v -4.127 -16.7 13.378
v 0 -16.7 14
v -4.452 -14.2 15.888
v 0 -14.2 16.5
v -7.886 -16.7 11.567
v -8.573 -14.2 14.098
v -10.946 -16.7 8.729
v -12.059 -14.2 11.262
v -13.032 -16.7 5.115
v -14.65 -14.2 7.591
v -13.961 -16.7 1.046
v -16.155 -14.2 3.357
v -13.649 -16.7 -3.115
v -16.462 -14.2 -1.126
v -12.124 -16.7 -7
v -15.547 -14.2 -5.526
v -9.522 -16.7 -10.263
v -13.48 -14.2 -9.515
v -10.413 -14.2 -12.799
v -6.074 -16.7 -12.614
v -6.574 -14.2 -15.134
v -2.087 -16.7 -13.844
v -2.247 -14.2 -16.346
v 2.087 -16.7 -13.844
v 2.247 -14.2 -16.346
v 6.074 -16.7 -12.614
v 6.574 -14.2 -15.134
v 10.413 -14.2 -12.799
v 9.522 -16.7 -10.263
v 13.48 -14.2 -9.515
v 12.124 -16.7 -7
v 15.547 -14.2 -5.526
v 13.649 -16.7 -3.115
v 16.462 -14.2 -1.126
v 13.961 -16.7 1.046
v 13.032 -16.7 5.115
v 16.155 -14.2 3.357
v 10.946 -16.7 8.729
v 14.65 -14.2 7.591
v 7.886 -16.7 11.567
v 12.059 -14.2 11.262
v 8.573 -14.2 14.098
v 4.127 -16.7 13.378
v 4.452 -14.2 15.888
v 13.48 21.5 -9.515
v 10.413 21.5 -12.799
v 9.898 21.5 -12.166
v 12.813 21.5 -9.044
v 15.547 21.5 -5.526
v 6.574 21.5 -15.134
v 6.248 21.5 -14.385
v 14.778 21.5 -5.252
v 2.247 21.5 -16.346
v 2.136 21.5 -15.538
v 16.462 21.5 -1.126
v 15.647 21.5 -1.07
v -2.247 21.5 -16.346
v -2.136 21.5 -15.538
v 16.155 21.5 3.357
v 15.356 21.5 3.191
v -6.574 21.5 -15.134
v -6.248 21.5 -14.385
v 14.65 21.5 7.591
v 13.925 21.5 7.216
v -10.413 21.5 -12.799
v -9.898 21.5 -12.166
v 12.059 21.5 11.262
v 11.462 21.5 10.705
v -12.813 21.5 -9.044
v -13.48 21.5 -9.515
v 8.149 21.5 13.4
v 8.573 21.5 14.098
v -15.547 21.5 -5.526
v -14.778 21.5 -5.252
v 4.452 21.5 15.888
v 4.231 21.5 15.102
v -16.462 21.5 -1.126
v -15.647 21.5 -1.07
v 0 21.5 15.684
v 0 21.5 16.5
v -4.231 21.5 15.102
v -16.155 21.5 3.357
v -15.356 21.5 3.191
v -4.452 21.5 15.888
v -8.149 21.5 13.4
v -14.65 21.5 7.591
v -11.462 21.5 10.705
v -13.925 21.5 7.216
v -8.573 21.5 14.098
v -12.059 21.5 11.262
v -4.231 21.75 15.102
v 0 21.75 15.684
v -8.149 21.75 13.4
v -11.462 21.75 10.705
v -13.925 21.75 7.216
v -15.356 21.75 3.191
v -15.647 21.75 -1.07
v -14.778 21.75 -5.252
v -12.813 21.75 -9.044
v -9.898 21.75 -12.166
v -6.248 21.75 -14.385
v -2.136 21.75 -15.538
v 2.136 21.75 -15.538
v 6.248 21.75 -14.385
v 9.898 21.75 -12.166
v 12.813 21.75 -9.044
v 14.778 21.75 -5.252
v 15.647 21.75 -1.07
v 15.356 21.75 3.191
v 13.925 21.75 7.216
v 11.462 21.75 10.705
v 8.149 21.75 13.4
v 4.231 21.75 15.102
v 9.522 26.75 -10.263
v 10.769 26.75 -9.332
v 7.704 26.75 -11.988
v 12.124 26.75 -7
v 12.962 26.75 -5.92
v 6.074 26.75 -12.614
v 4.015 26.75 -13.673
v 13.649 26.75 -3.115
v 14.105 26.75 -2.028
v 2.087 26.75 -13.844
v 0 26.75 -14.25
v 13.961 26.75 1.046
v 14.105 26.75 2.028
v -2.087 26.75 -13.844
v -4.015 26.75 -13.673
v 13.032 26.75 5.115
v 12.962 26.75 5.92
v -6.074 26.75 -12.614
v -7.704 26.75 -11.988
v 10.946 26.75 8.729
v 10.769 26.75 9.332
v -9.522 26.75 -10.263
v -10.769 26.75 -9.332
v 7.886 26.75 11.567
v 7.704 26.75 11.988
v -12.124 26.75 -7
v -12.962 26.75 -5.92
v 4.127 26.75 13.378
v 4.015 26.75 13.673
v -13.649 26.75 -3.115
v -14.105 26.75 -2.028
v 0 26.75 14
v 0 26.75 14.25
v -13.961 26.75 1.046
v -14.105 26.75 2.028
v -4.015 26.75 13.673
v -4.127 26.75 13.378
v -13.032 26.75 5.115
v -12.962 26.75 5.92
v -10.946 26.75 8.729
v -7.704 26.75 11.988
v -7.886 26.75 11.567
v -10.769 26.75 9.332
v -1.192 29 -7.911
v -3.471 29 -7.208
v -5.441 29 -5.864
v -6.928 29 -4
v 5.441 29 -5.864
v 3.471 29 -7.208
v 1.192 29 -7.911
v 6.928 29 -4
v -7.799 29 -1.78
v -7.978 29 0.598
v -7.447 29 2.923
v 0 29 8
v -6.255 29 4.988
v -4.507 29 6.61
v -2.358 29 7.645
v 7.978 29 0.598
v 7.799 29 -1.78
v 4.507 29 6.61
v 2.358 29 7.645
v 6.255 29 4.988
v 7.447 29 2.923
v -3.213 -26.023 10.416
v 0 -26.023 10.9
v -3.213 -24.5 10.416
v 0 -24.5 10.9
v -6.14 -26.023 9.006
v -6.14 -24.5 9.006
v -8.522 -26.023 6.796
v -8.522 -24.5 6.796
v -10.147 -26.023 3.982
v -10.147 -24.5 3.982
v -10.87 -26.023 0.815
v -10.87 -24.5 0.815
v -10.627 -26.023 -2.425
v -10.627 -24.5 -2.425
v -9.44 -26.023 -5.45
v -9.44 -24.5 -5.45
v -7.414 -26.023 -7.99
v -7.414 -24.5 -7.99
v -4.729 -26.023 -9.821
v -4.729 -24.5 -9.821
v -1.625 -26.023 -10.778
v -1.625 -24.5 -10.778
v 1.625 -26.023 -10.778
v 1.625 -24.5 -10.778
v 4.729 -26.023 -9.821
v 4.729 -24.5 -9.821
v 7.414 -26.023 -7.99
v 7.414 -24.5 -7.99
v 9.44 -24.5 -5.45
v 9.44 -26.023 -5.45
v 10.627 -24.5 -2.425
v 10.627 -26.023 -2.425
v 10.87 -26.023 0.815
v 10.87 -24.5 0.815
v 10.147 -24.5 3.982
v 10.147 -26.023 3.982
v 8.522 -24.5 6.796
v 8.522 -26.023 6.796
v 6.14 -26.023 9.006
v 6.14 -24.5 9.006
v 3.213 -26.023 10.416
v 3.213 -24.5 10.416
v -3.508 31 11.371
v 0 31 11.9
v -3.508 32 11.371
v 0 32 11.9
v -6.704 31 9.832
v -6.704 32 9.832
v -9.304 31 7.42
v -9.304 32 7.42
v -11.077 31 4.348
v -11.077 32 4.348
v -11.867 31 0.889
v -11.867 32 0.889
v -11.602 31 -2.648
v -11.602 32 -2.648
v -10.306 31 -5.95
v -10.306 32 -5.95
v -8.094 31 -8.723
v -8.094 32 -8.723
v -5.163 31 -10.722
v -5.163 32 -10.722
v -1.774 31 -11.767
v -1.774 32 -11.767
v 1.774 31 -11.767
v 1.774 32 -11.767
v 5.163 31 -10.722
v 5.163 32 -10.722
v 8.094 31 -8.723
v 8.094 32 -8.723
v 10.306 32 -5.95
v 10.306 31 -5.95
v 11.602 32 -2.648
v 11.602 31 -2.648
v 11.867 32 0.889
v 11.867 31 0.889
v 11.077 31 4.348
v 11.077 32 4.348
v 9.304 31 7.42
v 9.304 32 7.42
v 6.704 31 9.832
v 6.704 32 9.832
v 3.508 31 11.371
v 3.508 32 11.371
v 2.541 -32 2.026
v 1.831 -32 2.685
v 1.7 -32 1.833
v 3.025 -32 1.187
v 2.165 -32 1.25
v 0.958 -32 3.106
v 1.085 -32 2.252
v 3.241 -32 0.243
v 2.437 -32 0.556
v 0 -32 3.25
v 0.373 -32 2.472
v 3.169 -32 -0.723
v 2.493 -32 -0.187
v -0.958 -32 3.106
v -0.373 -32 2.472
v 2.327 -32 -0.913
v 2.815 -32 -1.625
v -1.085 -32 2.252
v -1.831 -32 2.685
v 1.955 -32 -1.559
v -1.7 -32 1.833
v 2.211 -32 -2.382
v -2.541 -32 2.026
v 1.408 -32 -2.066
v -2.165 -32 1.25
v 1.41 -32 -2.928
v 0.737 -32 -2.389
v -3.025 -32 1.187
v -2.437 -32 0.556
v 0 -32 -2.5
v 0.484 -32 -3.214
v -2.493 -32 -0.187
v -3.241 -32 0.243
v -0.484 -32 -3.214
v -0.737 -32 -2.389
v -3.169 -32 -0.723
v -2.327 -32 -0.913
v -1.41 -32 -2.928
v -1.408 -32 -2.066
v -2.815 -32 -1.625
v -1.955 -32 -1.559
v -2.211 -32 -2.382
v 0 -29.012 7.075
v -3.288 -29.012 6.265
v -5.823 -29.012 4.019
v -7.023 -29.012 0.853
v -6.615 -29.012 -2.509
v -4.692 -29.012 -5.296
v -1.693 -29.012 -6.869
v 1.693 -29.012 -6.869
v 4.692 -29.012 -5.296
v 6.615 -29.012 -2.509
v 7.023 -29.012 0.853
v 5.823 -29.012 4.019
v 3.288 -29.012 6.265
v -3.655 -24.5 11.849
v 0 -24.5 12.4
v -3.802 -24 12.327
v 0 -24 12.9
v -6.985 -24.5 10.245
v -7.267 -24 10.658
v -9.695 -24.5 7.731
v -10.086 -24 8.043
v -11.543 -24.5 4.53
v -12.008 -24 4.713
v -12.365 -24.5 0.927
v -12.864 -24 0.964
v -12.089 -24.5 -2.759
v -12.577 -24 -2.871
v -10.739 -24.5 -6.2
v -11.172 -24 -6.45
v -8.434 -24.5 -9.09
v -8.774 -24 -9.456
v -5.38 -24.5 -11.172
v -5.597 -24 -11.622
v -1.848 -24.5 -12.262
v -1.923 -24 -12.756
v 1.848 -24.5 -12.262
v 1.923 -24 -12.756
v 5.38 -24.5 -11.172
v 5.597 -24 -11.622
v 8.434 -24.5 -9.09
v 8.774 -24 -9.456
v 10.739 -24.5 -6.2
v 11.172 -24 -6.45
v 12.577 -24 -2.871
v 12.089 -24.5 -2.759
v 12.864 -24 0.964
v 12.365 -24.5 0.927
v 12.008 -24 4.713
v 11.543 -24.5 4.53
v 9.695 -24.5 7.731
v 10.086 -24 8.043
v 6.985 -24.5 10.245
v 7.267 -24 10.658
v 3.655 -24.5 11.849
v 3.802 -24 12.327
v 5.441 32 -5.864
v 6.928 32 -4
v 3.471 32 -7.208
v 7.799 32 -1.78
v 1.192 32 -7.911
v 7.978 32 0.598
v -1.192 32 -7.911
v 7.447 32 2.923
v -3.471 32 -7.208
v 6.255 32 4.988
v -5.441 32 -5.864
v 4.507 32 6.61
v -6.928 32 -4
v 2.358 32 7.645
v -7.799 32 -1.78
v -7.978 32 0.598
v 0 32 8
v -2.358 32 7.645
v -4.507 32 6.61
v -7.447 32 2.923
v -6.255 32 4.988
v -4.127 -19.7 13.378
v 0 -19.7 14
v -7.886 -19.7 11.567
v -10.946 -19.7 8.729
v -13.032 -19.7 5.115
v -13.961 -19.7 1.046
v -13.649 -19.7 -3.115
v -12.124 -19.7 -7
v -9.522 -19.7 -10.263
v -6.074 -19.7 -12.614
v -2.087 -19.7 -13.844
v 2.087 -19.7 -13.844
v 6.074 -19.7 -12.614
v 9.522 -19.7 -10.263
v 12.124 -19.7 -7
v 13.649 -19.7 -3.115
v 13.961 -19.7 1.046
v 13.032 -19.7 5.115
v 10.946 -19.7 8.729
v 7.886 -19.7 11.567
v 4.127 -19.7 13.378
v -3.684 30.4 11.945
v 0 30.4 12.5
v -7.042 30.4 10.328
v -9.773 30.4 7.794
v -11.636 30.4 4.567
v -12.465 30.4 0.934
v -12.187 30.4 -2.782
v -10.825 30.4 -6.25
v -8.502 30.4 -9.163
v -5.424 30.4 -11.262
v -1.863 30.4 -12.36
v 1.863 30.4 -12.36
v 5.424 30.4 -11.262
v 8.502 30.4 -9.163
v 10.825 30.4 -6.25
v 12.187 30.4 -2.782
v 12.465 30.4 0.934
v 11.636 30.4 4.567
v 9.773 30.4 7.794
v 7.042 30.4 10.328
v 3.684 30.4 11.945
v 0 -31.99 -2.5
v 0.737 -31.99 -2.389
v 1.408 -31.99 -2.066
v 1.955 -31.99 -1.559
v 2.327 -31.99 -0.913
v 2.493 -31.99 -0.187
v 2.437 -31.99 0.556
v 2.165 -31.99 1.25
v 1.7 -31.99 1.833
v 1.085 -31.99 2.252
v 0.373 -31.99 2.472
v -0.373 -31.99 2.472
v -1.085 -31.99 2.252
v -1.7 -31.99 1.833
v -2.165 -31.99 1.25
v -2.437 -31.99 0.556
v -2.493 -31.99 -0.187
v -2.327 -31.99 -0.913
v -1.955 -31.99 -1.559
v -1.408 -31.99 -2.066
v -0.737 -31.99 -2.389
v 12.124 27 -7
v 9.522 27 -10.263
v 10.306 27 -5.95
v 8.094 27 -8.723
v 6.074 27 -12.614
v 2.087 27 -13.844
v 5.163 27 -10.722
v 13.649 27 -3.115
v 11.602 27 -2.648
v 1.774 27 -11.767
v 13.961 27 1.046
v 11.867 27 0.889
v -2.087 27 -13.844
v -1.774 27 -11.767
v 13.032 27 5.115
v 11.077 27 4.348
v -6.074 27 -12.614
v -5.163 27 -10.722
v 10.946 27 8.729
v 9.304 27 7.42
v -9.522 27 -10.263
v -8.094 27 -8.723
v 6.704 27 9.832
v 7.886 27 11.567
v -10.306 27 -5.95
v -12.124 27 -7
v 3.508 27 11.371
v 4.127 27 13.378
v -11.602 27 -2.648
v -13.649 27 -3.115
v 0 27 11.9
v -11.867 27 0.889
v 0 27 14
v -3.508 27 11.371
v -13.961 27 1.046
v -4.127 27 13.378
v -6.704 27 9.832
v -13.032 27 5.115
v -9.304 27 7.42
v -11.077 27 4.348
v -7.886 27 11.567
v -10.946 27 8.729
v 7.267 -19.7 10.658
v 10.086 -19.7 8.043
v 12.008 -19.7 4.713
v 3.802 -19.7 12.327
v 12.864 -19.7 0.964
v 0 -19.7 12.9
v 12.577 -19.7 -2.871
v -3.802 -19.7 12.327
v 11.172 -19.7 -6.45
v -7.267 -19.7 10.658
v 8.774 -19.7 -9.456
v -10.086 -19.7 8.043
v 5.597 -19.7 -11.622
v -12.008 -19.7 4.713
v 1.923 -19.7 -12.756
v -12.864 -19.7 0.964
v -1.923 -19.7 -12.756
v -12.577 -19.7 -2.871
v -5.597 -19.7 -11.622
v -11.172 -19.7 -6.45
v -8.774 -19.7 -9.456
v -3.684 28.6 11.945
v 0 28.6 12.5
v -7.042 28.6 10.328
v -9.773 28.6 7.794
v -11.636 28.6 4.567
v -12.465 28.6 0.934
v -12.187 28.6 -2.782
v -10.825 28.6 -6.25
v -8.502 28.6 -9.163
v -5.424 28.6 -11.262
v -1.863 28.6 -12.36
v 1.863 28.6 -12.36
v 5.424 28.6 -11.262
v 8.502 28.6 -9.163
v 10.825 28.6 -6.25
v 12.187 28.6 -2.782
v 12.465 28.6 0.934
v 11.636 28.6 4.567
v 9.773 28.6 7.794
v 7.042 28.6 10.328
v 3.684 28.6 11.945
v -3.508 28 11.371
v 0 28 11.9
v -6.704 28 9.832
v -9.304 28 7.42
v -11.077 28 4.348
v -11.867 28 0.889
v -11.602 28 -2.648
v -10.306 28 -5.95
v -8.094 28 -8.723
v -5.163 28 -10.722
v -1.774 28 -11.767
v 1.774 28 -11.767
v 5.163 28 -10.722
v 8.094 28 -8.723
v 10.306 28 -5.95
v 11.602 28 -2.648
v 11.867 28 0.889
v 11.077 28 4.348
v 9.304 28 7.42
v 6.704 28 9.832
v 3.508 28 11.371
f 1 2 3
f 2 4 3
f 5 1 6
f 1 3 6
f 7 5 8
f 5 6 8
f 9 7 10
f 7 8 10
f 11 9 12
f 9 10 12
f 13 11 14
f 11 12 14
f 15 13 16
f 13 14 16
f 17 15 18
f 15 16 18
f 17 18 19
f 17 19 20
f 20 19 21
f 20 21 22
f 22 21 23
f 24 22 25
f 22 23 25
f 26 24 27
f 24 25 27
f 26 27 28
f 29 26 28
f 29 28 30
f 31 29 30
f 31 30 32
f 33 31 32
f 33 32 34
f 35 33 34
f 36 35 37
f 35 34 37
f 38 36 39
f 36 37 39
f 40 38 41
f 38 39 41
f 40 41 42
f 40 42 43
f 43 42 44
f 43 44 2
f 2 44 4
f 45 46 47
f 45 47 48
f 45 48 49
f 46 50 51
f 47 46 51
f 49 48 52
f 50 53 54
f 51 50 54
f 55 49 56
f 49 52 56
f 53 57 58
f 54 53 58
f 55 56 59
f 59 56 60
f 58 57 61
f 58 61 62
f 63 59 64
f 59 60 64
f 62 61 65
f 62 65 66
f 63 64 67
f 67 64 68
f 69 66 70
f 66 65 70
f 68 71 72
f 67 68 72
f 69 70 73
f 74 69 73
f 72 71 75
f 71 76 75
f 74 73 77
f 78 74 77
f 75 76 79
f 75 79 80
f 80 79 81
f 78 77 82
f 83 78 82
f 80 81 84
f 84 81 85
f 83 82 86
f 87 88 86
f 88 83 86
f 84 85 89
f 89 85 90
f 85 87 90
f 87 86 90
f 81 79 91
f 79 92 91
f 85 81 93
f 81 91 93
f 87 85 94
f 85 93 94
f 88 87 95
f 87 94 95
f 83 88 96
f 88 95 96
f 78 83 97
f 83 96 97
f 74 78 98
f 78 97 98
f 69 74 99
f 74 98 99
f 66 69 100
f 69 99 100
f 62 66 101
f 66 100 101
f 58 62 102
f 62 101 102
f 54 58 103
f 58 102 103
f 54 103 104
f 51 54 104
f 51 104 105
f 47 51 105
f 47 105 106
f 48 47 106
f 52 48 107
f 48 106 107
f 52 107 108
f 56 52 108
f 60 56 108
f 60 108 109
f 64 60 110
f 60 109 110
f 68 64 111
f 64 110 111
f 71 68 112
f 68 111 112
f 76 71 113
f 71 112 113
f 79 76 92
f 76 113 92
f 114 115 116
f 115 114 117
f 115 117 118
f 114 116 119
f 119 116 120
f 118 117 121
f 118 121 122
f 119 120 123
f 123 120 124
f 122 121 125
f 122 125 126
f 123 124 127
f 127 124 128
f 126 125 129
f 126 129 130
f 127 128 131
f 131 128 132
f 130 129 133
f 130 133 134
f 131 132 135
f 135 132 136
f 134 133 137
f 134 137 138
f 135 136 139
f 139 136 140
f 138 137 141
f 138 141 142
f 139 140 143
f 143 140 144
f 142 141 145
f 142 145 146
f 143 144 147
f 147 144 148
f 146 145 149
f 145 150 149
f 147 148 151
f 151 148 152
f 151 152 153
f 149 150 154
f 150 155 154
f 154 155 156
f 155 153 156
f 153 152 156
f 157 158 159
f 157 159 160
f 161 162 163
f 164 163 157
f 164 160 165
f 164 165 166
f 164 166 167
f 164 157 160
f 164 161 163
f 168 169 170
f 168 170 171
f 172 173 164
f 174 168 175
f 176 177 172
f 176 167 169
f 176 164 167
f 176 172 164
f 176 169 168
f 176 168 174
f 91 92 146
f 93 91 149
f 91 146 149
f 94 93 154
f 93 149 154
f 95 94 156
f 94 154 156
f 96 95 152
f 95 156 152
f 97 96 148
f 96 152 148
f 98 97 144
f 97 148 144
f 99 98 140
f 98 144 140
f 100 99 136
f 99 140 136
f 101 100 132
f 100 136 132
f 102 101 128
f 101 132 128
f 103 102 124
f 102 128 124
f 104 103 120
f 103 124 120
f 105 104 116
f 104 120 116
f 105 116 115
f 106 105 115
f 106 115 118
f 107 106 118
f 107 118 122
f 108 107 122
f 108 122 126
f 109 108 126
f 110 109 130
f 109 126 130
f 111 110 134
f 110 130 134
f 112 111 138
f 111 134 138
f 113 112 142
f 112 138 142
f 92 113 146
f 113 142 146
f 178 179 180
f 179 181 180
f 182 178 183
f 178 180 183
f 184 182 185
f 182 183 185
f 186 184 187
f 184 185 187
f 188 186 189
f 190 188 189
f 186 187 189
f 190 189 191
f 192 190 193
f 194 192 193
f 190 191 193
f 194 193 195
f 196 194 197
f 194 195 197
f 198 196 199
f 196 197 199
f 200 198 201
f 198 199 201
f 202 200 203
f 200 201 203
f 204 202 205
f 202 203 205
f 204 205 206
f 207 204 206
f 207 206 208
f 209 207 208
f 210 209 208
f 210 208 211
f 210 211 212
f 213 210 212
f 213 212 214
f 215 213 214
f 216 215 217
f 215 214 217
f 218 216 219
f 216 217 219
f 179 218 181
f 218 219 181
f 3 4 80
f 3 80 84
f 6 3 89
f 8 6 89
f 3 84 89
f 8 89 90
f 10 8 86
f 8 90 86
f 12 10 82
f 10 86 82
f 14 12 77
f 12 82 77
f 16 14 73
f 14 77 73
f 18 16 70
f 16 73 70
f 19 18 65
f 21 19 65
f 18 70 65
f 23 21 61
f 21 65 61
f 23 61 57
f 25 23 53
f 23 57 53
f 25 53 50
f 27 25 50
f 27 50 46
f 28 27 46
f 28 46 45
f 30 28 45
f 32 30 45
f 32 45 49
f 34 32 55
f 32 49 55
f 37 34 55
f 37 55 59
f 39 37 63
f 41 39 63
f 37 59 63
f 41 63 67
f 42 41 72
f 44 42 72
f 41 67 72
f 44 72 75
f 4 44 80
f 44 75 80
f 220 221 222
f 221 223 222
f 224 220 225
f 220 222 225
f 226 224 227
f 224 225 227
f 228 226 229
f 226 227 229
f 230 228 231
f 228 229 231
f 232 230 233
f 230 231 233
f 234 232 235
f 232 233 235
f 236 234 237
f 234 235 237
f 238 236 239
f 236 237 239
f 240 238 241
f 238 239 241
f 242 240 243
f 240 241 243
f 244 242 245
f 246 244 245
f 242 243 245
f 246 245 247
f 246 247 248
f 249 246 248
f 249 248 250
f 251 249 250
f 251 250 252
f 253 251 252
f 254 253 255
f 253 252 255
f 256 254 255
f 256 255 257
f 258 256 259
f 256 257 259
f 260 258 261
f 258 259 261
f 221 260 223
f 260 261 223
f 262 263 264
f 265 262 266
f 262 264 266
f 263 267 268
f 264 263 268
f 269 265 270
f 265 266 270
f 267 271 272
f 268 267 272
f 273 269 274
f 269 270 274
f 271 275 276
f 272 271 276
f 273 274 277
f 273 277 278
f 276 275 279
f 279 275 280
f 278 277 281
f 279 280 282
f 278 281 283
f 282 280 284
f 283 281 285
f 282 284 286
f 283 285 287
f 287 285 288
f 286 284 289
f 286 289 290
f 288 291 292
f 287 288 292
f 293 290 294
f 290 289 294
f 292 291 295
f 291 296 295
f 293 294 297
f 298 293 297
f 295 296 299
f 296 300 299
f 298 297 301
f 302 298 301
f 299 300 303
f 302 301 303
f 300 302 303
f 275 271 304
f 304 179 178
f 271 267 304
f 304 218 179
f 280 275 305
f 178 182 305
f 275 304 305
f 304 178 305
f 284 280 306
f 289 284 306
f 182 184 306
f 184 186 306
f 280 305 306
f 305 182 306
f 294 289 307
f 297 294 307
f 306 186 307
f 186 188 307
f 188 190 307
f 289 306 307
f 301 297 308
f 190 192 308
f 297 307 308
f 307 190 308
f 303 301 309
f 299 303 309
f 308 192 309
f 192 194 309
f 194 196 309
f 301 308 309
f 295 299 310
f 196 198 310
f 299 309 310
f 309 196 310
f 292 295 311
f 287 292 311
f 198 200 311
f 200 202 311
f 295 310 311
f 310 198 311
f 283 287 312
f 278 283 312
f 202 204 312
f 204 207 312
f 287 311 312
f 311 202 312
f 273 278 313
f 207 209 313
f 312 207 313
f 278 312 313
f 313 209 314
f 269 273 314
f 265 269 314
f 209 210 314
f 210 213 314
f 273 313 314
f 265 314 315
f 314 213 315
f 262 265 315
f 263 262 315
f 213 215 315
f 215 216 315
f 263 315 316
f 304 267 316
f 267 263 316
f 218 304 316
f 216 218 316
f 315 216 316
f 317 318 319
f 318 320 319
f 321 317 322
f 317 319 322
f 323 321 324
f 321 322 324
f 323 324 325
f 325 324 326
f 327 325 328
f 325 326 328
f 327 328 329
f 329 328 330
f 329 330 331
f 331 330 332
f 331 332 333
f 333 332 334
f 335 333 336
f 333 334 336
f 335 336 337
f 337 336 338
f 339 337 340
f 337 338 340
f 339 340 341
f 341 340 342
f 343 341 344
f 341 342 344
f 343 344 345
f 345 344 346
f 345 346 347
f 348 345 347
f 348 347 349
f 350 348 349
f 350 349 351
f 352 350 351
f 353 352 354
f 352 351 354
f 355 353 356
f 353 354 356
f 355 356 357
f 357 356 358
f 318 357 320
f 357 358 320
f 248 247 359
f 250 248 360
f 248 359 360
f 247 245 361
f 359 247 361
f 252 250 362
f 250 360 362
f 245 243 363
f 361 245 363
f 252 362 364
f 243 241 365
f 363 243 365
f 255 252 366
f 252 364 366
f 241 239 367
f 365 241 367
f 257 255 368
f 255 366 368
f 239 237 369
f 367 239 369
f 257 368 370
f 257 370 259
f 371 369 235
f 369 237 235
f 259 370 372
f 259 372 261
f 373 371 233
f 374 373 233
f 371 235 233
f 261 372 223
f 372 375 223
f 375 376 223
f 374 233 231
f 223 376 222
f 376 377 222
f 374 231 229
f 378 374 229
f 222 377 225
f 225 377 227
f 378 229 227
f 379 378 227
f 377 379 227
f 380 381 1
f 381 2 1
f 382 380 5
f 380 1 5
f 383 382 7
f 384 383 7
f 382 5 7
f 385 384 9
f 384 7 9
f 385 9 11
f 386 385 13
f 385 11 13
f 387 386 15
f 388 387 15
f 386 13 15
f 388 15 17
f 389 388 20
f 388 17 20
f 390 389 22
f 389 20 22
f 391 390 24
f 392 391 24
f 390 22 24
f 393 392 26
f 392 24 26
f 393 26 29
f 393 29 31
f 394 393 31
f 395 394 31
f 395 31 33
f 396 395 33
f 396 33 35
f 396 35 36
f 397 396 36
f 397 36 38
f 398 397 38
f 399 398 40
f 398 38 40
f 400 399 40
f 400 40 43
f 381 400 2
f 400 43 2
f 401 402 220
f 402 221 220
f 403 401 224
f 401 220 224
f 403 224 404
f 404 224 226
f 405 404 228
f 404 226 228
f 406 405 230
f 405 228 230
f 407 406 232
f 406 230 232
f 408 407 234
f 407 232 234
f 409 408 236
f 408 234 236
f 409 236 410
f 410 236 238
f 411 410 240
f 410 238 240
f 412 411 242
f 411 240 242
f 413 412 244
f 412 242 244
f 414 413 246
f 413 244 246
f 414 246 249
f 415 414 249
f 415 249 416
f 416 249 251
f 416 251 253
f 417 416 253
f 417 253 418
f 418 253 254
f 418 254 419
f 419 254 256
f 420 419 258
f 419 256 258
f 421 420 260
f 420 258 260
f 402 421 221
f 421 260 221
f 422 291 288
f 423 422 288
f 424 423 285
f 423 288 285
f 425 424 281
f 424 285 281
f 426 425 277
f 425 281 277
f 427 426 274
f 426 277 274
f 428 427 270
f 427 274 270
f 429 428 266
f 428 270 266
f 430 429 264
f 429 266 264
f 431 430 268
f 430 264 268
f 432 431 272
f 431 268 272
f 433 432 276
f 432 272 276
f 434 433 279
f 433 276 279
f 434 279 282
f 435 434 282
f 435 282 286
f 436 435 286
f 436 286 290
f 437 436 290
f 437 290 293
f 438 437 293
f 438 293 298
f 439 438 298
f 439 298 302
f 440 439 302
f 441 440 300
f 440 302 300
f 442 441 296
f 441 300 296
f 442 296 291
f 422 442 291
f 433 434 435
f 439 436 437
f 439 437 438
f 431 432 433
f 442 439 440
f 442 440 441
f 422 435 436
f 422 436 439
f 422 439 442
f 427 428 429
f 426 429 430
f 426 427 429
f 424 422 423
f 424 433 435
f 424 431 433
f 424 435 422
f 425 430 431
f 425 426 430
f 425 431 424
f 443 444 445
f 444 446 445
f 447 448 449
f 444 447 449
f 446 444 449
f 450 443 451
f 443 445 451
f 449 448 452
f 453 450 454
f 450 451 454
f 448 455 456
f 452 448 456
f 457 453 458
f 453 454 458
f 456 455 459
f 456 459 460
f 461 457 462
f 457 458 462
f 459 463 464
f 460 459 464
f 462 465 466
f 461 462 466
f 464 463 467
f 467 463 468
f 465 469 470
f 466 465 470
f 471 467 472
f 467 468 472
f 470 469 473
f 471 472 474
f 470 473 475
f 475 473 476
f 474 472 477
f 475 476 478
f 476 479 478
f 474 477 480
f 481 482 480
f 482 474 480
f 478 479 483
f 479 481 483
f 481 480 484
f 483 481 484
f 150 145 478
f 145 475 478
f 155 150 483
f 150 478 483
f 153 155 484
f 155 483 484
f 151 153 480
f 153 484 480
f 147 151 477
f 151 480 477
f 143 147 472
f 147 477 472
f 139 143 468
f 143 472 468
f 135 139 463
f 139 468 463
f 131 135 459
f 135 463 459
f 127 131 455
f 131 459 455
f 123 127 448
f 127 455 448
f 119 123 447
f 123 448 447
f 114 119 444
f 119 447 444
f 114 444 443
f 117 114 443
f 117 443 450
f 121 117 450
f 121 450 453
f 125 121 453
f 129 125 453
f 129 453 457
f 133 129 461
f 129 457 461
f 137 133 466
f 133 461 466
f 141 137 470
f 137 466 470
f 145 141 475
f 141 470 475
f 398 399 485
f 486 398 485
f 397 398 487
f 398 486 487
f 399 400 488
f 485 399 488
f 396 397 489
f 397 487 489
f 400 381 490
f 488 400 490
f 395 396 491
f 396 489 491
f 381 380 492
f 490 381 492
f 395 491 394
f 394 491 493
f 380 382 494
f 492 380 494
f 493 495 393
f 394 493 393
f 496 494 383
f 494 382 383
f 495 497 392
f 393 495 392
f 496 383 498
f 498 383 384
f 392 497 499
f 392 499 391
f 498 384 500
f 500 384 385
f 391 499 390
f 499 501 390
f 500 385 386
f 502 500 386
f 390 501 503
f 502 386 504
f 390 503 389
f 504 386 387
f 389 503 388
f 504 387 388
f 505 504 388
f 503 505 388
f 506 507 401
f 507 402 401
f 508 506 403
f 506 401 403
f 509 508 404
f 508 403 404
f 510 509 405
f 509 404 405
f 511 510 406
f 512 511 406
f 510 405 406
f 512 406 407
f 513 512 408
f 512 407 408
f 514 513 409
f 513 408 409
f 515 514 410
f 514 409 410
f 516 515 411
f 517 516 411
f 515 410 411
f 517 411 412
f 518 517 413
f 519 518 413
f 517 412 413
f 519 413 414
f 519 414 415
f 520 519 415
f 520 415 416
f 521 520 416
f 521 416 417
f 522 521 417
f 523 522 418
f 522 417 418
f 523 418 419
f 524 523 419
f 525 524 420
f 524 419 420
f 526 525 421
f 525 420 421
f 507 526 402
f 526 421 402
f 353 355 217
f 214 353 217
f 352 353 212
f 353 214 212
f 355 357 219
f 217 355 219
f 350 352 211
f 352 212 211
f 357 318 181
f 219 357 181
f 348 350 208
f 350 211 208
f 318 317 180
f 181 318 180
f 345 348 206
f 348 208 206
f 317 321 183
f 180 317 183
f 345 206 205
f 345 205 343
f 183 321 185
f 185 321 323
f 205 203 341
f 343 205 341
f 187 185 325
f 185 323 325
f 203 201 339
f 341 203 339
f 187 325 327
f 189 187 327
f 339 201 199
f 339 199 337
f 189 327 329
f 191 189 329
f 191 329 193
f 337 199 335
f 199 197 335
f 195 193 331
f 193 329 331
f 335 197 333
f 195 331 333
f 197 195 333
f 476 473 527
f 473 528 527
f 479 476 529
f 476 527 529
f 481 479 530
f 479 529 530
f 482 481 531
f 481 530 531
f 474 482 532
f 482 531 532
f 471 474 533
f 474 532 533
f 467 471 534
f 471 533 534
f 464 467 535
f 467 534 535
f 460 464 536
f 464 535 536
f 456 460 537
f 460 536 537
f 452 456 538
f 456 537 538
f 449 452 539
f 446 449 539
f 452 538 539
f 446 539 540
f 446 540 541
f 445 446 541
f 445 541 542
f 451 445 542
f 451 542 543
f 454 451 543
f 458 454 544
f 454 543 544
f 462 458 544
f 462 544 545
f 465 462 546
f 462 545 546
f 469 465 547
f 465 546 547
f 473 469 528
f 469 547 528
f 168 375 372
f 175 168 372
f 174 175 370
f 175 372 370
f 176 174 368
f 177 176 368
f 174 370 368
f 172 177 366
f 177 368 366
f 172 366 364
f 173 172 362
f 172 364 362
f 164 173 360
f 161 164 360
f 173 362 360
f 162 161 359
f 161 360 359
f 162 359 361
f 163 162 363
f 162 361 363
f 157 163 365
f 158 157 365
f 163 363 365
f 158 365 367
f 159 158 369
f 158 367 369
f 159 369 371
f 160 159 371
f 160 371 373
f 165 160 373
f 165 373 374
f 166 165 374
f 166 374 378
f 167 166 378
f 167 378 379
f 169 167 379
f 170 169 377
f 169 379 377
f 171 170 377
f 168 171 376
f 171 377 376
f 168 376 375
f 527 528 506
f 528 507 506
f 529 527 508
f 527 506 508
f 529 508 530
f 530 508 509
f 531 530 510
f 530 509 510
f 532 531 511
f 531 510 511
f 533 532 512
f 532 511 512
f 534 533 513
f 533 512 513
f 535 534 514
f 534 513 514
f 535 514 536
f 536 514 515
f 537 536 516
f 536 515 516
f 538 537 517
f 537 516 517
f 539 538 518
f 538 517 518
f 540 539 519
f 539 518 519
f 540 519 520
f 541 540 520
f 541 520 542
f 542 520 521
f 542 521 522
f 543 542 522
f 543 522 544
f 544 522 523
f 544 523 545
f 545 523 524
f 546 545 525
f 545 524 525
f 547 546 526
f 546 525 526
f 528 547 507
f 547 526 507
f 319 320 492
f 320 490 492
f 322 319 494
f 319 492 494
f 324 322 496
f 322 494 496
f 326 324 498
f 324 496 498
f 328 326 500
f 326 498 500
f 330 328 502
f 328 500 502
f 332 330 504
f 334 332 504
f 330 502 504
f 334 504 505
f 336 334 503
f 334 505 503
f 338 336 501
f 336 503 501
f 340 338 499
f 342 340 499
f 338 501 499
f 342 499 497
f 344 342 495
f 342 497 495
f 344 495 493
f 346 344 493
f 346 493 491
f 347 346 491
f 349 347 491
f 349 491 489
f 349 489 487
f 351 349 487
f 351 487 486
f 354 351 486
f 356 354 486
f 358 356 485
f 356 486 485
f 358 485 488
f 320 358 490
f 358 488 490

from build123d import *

# Parameters (mm, degrees)
SKETCH2_R          = 8
CUT_EXTRUDE1_DEPTH = 3
SKETCH3_R          = 2.5
CUT_EXTRUDE2_DEPTH = 0.01


with BuildPart() as part:
    # Sketch1 → Revolve1 (revolve)
    with BuildSketch(Plane(origin=(0, 0, 0), x_dir=(0, 0, -1), z_dir=(1, 0, 0))):
        Polygon((0, 32), (0, -32), (-3.25, -32), (-10.9, -26.023164957), (-10.9, -24.5), (-12.4, -24.5), (-12.9, -24), (-12.9, -19.7), (-14, -19.7), (-14, -16.7), (-16.5, -14.2), (-16.5, 21.5), (-15.683726929, 21.5), (-15.683726929, 21.75), (-14.25, 26.75), (-14, 26.75), (-14, 27), (-11.9, 27), (-11.9, 28), (-12.5, 28.6), (-12.5, 30.4), (-11.9, 31), (-11.9, 32), align=None)
    revolve(axis=Axis((0, 40, 0), (0, -1, 0)))

    # Sketch2 → Cut-Extrude1 (cut)
    with BuildSketch(Plane(origin=(0, 32, 0), x_dir=(1, 0, 0), z_dir=(0, 1, 0))):
        Circle(SKETCH2_R)
    extrude(amount=-CUT_EXTRUDE1_DEPTH, mode=Mode.SUBTRACT)

    # Sketch3 → Cut-Extrude2 (cut)
    with BuildSketch(Plane(origin=(0, -32, 0), x_dir=(-1, 0, 0), z_dir=(0, -1, 0))):
        Circle(SKETCH3_R)
    extrude(amount=-CUT_EXTRUDE2_DEPTH, mode=Mode.SUBTRACT)


solid = part.part
